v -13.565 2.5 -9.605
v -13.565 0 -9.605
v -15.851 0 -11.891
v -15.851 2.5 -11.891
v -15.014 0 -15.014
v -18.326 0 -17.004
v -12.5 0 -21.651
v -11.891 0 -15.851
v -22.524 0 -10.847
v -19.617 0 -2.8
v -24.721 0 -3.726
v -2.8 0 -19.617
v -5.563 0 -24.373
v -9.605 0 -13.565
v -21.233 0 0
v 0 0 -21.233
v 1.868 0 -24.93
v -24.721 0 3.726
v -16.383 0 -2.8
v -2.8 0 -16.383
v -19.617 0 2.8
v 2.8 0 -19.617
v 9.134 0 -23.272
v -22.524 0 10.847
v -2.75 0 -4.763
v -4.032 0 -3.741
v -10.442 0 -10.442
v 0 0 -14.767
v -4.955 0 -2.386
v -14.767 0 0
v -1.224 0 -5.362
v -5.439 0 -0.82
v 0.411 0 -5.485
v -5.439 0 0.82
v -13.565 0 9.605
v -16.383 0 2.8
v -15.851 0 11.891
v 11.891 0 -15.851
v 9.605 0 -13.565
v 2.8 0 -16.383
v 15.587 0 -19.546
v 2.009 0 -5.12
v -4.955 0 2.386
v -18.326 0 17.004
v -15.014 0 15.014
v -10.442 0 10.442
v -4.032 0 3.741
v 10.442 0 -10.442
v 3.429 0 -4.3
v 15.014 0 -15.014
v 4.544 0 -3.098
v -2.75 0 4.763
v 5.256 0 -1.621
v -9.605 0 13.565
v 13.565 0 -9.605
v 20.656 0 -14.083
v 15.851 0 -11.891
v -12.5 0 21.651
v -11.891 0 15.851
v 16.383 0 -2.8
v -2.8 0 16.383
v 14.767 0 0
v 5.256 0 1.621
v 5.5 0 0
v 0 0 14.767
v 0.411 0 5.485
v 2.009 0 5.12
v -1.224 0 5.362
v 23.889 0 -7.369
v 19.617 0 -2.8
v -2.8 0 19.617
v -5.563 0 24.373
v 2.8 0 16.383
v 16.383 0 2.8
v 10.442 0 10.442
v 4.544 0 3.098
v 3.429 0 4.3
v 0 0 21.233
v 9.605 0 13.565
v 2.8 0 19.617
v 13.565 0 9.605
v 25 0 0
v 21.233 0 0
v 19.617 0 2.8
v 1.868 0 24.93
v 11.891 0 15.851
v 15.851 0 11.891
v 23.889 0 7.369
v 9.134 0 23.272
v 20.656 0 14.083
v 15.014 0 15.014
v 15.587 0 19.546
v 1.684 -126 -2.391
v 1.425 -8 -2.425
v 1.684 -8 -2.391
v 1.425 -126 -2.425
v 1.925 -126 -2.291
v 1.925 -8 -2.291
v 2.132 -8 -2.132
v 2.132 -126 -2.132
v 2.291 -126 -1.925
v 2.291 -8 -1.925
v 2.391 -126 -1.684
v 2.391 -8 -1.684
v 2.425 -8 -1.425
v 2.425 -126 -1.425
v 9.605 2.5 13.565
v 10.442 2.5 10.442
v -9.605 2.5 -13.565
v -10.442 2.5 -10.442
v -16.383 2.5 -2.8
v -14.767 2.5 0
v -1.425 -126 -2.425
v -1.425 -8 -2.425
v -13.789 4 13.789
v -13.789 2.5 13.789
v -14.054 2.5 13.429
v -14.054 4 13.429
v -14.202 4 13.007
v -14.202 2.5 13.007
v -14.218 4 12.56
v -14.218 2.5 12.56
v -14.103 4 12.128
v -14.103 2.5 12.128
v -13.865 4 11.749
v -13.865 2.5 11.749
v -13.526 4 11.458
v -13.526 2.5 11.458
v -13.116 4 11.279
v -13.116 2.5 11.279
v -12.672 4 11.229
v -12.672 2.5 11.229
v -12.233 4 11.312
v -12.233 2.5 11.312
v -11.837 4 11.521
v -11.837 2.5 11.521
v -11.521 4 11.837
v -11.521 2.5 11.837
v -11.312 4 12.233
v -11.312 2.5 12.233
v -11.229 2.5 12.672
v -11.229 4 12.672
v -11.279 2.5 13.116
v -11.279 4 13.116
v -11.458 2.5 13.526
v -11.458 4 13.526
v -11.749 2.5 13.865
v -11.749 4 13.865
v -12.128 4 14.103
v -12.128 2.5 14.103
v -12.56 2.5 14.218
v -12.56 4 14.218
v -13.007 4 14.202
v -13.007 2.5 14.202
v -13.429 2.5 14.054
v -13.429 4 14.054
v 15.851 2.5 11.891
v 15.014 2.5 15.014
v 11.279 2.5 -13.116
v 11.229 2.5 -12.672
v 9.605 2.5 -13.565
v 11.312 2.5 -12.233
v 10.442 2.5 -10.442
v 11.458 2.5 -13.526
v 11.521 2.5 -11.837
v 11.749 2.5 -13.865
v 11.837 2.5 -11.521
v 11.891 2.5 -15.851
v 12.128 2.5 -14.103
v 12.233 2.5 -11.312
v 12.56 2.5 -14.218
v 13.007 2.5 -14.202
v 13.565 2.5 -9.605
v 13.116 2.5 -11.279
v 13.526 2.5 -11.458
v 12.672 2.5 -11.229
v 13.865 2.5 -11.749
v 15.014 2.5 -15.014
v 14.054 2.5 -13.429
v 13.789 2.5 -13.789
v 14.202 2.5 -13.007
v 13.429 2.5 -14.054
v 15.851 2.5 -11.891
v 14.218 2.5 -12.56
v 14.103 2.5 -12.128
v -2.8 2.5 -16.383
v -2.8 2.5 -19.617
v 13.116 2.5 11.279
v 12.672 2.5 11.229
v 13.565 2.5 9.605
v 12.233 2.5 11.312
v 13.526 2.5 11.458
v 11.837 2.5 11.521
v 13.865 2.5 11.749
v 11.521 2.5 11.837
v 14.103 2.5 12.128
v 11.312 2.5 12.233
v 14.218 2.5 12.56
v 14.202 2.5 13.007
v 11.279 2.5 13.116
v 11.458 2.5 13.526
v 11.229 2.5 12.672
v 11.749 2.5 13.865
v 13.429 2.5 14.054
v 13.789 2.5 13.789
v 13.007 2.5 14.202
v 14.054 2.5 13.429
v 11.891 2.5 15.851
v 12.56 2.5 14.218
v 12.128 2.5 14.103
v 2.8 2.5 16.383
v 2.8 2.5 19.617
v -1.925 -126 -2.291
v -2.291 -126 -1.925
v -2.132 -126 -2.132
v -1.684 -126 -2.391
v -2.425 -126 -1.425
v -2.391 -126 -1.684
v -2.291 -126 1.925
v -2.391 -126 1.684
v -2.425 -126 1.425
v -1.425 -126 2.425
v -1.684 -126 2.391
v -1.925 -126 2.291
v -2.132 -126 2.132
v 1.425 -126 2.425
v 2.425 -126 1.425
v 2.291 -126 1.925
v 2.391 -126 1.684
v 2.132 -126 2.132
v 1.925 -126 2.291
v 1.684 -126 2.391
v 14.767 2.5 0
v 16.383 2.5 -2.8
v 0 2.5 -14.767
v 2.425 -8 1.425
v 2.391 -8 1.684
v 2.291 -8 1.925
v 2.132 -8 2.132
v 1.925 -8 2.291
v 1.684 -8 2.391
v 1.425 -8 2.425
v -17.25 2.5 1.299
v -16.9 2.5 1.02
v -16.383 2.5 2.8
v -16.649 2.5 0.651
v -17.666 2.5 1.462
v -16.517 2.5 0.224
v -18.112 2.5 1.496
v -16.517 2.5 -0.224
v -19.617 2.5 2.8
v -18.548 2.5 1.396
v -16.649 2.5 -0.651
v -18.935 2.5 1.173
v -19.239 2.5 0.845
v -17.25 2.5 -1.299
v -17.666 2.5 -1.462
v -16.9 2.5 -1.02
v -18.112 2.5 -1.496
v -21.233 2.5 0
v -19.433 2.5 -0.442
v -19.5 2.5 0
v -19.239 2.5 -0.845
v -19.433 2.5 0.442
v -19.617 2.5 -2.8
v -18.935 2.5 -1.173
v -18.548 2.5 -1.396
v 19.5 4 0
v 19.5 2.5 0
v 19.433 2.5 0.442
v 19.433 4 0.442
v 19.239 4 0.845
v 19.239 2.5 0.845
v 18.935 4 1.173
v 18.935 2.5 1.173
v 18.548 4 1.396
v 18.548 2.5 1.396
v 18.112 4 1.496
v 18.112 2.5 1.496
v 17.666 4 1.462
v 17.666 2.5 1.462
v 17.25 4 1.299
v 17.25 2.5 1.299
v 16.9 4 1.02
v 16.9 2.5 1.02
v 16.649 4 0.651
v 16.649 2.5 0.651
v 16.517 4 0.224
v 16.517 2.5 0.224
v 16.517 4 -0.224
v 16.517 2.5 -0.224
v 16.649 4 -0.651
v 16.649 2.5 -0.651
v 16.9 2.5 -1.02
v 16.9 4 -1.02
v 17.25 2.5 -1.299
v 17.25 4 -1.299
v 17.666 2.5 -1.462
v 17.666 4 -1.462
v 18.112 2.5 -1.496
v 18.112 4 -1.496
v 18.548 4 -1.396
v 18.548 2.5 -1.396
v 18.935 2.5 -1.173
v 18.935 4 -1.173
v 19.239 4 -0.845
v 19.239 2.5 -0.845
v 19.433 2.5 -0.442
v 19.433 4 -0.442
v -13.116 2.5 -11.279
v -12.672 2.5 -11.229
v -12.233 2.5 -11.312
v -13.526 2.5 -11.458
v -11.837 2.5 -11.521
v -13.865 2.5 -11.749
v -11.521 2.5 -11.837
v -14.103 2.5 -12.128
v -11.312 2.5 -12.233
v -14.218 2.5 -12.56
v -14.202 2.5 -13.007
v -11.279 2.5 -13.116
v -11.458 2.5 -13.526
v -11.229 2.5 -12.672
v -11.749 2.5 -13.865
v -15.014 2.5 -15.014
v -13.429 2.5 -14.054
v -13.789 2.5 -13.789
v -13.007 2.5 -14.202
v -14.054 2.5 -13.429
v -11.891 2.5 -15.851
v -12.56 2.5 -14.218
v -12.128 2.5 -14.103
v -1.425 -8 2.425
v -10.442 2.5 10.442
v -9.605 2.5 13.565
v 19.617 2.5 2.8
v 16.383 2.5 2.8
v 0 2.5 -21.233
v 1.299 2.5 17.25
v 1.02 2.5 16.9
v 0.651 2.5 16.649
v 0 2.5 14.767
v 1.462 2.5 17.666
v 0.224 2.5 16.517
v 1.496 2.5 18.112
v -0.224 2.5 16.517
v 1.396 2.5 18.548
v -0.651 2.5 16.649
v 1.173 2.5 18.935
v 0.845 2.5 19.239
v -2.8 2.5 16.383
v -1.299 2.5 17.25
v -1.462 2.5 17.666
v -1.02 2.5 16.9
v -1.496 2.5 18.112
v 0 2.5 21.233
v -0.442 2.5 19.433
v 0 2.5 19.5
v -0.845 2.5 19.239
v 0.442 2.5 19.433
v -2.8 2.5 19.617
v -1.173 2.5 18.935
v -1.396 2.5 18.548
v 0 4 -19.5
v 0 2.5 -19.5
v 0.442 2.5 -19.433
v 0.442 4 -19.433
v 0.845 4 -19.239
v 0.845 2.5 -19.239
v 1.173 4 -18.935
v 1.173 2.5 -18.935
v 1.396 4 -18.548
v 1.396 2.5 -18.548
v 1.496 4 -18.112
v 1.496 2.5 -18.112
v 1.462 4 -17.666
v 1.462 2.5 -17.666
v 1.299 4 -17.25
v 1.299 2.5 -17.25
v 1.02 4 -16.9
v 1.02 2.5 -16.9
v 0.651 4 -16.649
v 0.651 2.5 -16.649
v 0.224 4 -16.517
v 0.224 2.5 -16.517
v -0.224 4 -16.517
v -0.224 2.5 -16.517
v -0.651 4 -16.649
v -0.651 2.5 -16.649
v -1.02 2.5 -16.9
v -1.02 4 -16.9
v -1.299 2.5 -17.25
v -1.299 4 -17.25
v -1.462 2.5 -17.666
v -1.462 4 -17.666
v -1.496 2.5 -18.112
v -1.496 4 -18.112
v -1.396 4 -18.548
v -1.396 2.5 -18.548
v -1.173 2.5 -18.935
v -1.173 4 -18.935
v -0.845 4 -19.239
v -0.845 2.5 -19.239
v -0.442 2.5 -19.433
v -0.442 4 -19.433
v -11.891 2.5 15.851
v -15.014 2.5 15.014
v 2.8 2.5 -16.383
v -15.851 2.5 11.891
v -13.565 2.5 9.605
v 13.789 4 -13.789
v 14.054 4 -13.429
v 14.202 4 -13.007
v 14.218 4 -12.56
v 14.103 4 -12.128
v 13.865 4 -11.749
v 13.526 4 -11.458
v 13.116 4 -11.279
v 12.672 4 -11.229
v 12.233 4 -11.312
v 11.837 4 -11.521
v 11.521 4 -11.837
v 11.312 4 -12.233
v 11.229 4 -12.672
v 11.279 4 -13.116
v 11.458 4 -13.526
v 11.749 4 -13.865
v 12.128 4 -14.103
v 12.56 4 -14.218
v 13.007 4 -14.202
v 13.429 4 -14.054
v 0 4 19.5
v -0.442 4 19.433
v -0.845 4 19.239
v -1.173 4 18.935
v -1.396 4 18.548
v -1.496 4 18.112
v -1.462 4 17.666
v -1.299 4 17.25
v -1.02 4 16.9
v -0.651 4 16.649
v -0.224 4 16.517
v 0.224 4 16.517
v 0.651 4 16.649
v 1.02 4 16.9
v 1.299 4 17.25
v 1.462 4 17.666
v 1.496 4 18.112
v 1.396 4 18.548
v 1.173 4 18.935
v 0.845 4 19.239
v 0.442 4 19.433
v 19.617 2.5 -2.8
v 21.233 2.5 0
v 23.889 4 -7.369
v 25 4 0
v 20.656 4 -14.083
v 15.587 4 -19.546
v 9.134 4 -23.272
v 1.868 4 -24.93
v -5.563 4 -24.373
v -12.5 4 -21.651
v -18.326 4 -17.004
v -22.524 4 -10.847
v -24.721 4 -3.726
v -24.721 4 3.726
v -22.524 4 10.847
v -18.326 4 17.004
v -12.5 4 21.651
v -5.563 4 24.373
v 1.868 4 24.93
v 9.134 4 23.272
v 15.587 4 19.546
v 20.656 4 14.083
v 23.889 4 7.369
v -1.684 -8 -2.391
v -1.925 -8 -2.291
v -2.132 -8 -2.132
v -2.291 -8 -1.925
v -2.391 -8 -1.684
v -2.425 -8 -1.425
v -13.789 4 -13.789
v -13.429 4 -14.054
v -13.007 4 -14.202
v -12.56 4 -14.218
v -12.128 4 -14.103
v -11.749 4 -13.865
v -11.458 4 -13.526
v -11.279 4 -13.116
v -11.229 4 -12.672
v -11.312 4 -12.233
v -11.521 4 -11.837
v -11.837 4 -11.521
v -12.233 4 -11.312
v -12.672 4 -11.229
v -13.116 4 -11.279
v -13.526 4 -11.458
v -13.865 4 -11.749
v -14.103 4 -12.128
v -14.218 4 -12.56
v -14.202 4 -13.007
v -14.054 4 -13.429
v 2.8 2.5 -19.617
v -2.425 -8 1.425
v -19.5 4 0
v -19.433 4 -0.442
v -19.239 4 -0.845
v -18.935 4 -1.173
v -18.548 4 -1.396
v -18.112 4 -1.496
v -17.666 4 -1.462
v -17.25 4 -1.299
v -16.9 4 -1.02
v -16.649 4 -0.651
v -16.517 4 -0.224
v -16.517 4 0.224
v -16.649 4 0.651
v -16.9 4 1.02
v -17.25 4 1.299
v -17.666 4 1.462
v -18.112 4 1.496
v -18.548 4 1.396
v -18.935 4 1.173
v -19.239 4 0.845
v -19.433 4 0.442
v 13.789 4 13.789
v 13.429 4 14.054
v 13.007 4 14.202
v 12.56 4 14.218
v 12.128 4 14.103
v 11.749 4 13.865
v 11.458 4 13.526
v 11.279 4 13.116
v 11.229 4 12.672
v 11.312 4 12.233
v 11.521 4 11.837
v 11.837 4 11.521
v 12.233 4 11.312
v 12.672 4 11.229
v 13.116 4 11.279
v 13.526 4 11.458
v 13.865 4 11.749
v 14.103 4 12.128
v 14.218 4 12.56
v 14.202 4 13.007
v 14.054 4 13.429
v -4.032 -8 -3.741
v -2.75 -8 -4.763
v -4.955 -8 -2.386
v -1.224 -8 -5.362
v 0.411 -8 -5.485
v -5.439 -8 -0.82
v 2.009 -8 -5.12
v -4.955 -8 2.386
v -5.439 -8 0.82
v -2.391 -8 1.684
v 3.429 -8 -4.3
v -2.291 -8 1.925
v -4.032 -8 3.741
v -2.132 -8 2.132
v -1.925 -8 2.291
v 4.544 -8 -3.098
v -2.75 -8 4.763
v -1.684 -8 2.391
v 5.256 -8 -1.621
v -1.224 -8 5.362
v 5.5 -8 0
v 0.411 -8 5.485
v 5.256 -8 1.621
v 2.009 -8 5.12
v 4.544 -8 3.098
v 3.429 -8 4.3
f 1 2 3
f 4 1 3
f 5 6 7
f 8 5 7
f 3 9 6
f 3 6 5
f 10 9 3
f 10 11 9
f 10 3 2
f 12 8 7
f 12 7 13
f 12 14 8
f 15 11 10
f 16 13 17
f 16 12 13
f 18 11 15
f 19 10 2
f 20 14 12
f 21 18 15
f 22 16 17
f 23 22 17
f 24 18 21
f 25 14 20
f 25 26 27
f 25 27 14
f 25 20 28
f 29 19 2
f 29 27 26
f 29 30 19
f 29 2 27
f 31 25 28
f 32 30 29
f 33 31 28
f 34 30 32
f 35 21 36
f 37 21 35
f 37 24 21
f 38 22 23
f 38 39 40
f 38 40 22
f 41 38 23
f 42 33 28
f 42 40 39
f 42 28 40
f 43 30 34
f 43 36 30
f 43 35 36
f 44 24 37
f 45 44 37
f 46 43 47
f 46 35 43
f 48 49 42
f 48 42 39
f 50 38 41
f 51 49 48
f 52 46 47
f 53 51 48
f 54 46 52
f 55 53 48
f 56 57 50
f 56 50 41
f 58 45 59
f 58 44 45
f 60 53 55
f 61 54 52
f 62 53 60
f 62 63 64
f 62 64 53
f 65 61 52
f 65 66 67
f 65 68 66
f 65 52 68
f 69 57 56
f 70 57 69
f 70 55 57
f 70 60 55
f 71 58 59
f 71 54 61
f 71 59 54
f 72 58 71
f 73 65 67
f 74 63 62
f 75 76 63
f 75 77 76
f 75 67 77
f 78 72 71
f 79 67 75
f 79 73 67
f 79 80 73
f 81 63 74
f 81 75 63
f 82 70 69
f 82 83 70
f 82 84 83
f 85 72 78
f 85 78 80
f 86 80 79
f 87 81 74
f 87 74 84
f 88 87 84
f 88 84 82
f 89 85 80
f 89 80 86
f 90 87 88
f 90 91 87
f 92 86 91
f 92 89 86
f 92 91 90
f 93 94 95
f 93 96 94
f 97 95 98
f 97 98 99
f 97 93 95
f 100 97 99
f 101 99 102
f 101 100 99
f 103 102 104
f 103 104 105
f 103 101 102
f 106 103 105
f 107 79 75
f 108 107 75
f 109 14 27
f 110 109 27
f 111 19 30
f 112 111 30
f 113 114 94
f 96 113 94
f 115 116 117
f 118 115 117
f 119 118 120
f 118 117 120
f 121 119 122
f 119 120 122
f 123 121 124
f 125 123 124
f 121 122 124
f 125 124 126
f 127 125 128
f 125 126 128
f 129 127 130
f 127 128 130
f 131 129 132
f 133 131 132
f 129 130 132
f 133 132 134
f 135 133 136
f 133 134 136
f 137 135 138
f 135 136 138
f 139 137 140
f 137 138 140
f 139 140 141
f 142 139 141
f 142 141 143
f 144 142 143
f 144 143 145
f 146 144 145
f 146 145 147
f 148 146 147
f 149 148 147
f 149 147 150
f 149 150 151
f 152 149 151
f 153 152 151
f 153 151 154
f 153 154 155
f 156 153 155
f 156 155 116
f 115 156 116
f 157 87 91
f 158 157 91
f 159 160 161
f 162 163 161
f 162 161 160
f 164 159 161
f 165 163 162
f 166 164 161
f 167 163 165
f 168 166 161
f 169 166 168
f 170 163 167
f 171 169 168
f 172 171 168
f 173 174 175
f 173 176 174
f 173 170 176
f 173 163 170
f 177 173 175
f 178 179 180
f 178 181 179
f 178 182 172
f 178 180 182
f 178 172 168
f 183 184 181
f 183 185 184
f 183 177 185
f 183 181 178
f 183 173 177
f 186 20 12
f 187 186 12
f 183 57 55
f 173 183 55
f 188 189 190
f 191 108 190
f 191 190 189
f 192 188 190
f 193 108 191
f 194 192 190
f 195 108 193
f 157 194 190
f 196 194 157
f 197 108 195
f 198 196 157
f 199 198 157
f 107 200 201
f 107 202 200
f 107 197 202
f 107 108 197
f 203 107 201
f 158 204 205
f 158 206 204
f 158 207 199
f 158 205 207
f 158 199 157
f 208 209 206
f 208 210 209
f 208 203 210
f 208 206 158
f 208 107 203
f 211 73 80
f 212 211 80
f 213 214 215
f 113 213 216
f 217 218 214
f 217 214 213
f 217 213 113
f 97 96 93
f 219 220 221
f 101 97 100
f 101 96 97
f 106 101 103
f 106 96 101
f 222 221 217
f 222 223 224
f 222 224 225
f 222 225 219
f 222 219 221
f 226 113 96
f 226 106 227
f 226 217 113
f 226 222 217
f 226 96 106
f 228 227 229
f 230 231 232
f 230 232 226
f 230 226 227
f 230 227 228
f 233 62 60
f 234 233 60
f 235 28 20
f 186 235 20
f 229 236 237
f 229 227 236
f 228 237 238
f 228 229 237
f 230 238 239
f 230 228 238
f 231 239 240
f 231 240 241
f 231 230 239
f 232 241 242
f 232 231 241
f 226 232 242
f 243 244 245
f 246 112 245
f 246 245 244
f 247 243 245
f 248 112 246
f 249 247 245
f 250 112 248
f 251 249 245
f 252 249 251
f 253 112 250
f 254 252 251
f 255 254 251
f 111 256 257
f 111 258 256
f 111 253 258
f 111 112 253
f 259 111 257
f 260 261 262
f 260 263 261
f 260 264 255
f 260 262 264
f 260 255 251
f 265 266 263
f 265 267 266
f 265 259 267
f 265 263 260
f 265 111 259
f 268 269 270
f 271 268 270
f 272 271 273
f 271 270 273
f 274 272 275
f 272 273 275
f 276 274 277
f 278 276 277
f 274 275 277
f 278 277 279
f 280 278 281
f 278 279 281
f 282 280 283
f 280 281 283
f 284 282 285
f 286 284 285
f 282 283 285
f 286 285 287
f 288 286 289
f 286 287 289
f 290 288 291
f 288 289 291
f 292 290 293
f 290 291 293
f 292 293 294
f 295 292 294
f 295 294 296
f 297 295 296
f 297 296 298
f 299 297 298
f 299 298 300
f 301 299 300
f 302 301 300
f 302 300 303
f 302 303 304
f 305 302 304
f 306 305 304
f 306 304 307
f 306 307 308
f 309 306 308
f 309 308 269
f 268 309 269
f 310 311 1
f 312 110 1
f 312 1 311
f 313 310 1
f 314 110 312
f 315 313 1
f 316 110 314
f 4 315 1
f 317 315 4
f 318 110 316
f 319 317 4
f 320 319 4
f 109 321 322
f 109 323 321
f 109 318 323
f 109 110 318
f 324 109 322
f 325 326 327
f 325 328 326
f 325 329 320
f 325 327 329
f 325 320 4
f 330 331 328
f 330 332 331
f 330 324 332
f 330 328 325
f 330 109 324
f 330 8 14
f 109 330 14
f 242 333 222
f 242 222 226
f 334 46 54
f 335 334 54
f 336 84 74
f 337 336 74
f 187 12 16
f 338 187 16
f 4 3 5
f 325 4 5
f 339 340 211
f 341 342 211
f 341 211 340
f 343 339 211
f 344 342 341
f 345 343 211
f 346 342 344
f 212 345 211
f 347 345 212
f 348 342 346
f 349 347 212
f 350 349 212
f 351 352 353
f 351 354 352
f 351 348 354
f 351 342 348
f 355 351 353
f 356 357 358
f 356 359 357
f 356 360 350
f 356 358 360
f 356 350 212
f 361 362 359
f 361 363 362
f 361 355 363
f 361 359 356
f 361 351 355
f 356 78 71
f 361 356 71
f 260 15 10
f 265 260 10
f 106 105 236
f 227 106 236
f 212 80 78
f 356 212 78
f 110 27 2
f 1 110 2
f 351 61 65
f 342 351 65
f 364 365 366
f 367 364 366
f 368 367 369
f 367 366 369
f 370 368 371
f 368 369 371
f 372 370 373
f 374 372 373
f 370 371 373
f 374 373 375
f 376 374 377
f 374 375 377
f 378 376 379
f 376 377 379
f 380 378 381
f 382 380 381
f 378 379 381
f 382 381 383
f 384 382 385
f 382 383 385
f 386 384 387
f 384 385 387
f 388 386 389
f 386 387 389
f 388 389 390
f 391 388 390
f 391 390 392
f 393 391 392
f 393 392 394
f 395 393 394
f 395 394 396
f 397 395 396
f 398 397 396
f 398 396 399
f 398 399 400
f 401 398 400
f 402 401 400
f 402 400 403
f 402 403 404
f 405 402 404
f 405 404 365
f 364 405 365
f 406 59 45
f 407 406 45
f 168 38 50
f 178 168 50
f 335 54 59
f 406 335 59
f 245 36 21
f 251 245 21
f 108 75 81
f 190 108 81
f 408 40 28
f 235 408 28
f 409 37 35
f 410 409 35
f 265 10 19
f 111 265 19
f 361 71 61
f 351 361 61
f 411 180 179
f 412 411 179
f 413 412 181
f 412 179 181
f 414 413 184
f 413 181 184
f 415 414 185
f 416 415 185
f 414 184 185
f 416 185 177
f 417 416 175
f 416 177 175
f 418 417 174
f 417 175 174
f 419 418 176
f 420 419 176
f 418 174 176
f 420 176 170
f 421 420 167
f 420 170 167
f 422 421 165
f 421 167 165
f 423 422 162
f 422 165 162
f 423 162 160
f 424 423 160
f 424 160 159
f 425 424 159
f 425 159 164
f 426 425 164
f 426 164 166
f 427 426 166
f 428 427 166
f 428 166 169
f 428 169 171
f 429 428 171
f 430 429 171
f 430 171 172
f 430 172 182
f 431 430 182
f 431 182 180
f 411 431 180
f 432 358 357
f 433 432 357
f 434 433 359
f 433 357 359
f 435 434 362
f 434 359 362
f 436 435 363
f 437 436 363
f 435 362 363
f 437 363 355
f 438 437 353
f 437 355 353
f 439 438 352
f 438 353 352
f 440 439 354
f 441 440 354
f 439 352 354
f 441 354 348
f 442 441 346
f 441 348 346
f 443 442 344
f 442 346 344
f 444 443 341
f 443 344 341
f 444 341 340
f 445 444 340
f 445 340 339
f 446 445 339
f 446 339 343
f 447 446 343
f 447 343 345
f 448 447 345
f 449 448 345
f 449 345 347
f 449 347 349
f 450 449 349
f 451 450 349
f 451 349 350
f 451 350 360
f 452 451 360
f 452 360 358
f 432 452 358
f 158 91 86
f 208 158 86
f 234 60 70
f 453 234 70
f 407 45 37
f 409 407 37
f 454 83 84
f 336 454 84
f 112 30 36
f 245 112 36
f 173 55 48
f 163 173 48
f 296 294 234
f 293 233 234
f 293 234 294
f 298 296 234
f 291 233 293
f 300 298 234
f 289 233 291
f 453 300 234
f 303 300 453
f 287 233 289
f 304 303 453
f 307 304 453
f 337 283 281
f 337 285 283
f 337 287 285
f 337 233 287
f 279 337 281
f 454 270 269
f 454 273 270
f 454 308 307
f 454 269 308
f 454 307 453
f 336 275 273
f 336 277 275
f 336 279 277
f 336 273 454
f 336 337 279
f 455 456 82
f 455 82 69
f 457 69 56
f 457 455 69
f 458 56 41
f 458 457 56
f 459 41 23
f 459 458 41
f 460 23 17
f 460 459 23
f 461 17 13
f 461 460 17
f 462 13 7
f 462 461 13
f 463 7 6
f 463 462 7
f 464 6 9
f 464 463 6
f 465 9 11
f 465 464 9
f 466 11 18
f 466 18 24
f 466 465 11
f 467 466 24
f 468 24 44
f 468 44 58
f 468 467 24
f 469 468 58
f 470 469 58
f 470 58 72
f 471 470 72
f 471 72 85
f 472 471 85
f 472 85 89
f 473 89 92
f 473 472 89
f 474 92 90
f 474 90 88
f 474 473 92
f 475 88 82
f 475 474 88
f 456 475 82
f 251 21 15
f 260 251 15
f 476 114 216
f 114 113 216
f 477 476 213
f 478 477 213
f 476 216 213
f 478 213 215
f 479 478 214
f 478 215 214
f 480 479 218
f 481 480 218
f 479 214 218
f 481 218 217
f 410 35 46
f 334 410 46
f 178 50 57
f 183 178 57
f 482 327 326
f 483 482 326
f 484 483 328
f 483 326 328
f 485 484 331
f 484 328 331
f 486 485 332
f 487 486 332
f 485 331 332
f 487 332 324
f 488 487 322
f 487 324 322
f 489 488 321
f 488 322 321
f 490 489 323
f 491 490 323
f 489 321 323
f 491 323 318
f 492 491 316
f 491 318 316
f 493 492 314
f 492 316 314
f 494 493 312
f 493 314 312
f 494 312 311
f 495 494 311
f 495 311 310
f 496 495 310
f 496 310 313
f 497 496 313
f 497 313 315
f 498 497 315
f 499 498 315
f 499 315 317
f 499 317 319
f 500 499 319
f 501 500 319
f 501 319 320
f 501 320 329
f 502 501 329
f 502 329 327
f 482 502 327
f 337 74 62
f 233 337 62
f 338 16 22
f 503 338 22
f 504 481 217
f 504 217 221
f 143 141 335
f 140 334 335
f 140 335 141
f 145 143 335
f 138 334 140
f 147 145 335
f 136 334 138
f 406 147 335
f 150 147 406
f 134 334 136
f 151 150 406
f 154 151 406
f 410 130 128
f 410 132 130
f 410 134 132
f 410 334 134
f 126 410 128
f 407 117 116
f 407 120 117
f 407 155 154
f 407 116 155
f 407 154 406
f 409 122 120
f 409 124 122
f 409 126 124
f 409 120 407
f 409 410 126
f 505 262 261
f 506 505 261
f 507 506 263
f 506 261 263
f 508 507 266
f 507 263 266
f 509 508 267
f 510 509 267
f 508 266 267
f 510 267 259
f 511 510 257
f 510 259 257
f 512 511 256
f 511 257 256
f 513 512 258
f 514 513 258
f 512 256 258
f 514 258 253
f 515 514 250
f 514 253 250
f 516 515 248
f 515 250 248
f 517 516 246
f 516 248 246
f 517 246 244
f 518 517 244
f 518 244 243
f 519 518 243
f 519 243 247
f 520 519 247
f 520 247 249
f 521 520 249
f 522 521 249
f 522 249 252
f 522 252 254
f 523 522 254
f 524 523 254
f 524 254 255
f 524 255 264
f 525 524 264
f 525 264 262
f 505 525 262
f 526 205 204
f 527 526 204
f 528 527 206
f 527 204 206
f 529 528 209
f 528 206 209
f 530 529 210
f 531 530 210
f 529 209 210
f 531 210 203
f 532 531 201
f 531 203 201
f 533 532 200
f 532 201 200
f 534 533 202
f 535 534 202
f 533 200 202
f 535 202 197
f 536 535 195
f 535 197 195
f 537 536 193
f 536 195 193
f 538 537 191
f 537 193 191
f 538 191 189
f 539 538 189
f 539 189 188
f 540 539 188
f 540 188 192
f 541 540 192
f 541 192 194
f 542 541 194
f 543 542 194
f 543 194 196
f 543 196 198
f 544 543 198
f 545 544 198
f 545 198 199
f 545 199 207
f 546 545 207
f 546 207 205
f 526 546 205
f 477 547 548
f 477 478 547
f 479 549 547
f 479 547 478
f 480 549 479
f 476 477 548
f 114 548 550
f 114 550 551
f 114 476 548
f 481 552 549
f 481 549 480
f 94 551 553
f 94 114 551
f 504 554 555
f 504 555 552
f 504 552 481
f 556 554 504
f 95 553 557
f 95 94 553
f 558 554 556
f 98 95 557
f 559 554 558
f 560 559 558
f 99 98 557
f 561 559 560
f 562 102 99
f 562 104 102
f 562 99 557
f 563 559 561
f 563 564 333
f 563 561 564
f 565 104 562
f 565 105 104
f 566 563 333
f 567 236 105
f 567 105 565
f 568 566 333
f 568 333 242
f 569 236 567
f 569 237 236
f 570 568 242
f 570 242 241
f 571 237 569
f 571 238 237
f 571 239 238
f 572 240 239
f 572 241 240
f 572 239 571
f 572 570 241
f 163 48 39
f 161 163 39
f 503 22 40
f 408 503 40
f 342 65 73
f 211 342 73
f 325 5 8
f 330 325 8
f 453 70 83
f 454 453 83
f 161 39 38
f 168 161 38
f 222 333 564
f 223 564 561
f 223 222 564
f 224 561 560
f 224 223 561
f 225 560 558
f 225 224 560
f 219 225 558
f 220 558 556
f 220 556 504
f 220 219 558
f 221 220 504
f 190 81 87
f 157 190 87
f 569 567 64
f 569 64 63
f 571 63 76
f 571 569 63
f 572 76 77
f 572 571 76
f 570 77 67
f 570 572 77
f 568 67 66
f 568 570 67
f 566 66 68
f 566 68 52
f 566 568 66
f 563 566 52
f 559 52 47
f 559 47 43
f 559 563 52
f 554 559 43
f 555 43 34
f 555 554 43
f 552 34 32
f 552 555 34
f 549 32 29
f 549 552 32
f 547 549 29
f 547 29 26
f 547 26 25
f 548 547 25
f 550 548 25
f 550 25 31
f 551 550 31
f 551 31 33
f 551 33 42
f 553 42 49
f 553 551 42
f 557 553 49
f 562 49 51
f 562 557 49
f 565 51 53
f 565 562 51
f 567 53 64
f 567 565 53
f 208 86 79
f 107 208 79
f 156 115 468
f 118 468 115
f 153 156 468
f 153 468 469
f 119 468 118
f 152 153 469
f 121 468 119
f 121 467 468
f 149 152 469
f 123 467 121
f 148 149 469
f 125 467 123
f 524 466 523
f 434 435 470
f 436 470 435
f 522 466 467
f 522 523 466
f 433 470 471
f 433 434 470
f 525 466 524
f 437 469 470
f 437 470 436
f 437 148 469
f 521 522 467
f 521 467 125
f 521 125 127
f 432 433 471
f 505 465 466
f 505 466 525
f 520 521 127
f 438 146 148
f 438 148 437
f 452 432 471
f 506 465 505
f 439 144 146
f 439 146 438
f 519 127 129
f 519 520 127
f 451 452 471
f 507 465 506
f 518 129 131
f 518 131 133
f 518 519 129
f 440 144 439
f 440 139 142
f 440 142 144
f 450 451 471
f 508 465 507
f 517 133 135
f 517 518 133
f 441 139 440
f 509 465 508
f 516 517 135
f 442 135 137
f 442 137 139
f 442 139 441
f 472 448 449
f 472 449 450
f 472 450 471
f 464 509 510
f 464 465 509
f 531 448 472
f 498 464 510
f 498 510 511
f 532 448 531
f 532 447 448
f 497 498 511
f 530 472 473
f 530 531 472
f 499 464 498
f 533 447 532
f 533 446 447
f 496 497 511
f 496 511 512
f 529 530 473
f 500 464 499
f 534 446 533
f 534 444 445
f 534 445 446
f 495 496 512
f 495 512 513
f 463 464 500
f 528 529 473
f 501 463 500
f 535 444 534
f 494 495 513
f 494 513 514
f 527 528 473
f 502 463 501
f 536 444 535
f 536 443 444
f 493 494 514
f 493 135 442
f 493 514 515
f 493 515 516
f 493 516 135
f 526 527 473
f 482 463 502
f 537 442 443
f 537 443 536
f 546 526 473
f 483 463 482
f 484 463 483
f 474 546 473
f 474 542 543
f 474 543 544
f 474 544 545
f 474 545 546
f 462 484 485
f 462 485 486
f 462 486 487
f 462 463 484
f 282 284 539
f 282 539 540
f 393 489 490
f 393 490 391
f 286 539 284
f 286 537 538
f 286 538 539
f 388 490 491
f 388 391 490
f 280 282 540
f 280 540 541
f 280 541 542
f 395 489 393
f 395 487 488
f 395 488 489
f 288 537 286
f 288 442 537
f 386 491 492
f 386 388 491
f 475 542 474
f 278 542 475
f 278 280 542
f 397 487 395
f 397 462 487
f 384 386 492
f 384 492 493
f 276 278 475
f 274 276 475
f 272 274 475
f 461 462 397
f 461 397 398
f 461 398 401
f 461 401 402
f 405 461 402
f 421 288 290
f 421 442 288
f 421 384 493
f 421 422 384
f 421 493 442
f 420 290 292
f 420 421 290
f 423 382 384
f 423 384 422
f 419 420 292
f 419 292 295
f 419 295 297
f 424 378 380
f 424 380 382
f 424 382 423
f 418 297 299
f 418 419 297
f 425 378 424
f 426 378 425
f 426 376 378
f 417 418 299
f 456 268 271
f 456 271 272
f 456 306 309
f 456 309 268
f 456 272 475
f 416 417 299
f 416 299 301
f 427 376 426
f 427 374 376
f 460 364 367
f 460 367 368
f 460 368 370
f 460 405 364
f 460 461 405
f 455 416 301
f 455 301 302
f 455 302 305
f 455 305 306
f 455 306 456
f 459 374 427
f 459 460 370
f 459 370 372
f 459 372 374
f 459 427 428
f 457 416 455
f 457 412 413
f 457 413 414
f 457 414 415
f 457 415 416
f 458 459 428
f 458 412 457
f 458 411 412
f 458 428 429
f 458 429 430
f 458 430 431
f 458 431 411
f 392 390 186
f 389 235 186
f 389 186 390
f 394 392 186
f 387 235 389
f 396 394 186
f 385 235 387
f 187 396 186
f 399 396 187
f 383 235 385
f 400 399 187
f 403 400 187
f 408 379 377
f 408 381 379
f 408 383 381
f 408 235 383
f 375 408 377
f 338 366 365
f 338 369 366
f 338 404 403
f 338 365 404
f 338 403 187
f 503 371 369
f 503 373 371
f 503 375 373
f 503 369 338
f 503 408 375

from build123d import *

# Parameters (mm, degrees)
SKETCH_1_R               = 20
EXTRUDE_1_DEPTH          = 4
SKETCH_2_R               = 7.407075634
EXTRUDE_2_DEPTH          = 8
SKETCH_3_W               = 4.85
SKETCH_3_H               = 4.85
EXTRUDE_3_DEPTH          = 118
SKETCH_5_R               = 25
EXTRUDE_4_DEPTH          = 4
CUT_EXTRUDE_1_DEPTH      = 2.5
SKETCH_7_R               = 1.5
CUT_EXTRUDE_2_DEPTH      = 2.5
PATTERN_CIRCULAR_1_COUNT = 8
FILLET_1_R               = 1
SKETCH_9_R               = 25
EXTRUDE_5_DEPTH          = 4
SKETCH_10_R              = 5.5
EXTRUDE_6_DEPTH          = 8
SKETCH_11_W              = 4.85
SKETCH_11_H              = 4.85
EXTRUDE_7_DEPTH          = 118
CUT_EXTRUDE_7_DEPTH      = 128.5
SKETCH_13_R              = 1.5
CUT_EXTRUDE_8_DEPTH      = 128.5
PATTERN_CIRCULAR_2_COUNT = 8
FILLET_2_R               = 1
SKETCH_14_R              = 7.407075634
SKETCH_14_R_2            = 5.5
CUT_EXTRUDE_9_DEPTH      = 8
SKETCH_15_W              = 54.152446135
SKETCH_15_H              = 58.876914062
CUT_EXTRUDE_10_DEPTH     = 130


with BuildPart() as part:
    # 草图1 → 凸台-拉伸1 (new body)
    with BuildSketch(Plane(origin=(0, 0, 0), x_dir=(1, 0, 0), z_dir=(0, 1, 0))):
        Circle(SKETCH_1_R)
    extrude(amount=EXTRUDE_1_DEPTH)

    # 草图2 → 凸台-拉伸2 (add)
    with BuildSketch(Plane.XZ):
        Circle(SKETCH_2_R)
    extrude(amount=EXTRUDE_2_DEPTH)

    # 草图3 → 凸台-拉伸3 (add)
    with BuildSketch(Plane.XZ.offset(8)):
        Rectangle(SKETCH_3_W, SKETCH_3_H)
    extrude(amount=EXTRUDE_3_DEPTH)

    # 草图5 → 凸台-拉伸4 (add)
    with BuildSketch(Plane(origin=(0, 4, 0), x_dir=(1, 0, 0), z_dir=(0, 1, 0))):
        Circle(SKETCH_5_R)
    extrude(amount=-EXTRUDE_4_DEPTH)

    # 草图6 → 切除-拉伸1 (cut)
    with BuildSketch(Plane.XZ):
        Polygon((21.233161507, 0), (19.616580754, 2.8), (16.383419246, 2.8), (14.766838493, 0), (16.383419246, -2.8), (19.616580754, -2.8), align=None)
    cut_extrude_1 = extrude(amount=-CUT_EXTRUDE_1_DEPTH, mode=Mode.SUBTRACT)

    # 草图7 → 切除-拉伸2 (cut)
    with BuildSketch(Plane.XZ.offset(-2.5)):
        with Locations((18, 0)):
            Circle(SKETCH_7_R)
    cut_extrude_2 = extrude(amount=-CUT_EXTRUDE_2_DEPTH, mode=Mode.SUBTRACT)

    # 阵列(圆周)1: 切除-拉伸1, 切除-拉伸2 ×8 about axis
    pattern_circular_1_axis = Axis((0, 0, 0), (0, 1, 0))
    for i in range(1, PATTERN_CIRCULAR_1_COUNT):
        add(cut_extrude_1.rotate(pattern_circular_1_axis, i * 360 / PATTERN_CIRCULAR_1_COUNT), mode=Mode.SUBTRACT)
        add(cut_extrude_2.rotate(pattern_circular_1_axis, i * 360 / PATTERN_CIRCULAR_1_COUNT), mode=Mode.SUBTRACT)

    # 圆角1
    fillet_1_edges = [part.edges().sort_by_distance(p)[0] for p in [
        (2.425, -67, -2.425),
        (2.425, -67, 2.425),
        (-2.425, -67, 2.425),
        (-2.425, -67, -2.425),
    ]]
    fillet(fillet_1_edges, radius=FILLET_1_R)

    # 草图14 → 切除-拉伸9 (cut)
    with BuildSketch(Plane.XZ.offset(8)):
        Circle(SKETCH_14_R)
        Circle(SKETCH_14_R_2, mode=Mode.SUBTRACT)
    extrude(amount=-CUT_EXTRUDE_9_DEPTH, mode=Mode.SUBTRACT)


with BuildPart() as body_2:
    # 草图9 → 凸台-拉伸5 (new body)
    with BuildSketch(Plane(origin=(0, 0, 0), x_dir=(1, 0, 0), z_dir=(0, 1, 0))):
        with Locations((53.487556259, 0)):
            Circle(SKETCH_9_R)
    extrude(amount=EXTRUDE_5_DEPTH)

    # 草图10 → 凸台-拉伸6 (add)
    with BuildSketch(Plane.XZ):
        with Locations((53.487556259, 0)):
            Circle(SKETCH_10_R)
    extrude(amount=EXTRUDE_6_DEPTH)

    # 草图11 → 凸台-拉伸7 (add)
    with BuildSketch(Plane.XZ.offset(8)):
        with Locations((53.487556259, 0)):
            Rectangle(SKETCH_11_W, SKETCH_11_H)
    extrude(amount=EXTRUDE_7_DEPTH)

    # 草图12 → 切除-拉伸7 (cut)
    with BuildSketch(Plane.XZ.offset(126)):
        Polygon((38.720717767, 0), (37.104137013, 2.8), (33.870975506, 2.8), (32.254394752, 0), (33.870975506, -2.8), (37.104137013, -2.8), align=None)
    cut_extrude_7 = extrude(amount=-CUT_EXTRUDE_7_DEPTH, mode=Mode.SUBTRACT)

    # 草图13 → 切除-拉伸8 (cut)
    with BuildSketch(Plane.XZ.offset(-2.5)):
        with Locations((35.487556259, 0)):
            Circle(SKETCH_13_R)
    cut_extrude_8 = extrude(amount=-CUT_EXTRUDE_8_DEPTH, mode=Mode.SUBTRACT)

    # 阵列(圆周)2: 切除-拉伸7, 切除-拉伸8 ×8 about axis
    pattern_circular_2_axis = Axis((53.487556259, 0, 0), (0, 1, 0))
    for i in range(1, PATTERN_CIRCULAR_2_COUNT):
        add(cut_extrude_7.rotate(pattern_circular_2_axis, i * 360 / PATTERN_CIRCULAR_2_COUNT), mode=Mode.SUBTRACT)
        add(cut_extrude_8.rotate(pattern_circular_2_axis, i * 360 / PATTERN_CIRCULAR_2_COUNT), mode=Mode.SUBTRACT)

    # 圆角2
    fillet_2_edges = [body_2.edges().sort_by_distance(p)[0] for p in [
        (55.912556259, -67, -2.425),
        (55.912556259, -67, 2.425),
        (51.062556259, -67, 2.425),
        (51.062556259, -67, -2.425),
    ]]
    fillet(fillet_2_edges, radius=FILLET_2_R)

    # 草图15 → 切除-拉伸10 (cut)
    with BuildSketch(Plane(origin=(0, 4, 0), x_dir=(1, 0, 0), z_dir=(0, 1, 0))):
        with Locations((53.48755626, 0)):
            Rectangle(SKETCH_15_W, SKETCH_15_H)
    extrude(amount=-CUT_EXTRUDE_10_DEPTH, mode=Mode.SUBTRACT)


solid = part.part
